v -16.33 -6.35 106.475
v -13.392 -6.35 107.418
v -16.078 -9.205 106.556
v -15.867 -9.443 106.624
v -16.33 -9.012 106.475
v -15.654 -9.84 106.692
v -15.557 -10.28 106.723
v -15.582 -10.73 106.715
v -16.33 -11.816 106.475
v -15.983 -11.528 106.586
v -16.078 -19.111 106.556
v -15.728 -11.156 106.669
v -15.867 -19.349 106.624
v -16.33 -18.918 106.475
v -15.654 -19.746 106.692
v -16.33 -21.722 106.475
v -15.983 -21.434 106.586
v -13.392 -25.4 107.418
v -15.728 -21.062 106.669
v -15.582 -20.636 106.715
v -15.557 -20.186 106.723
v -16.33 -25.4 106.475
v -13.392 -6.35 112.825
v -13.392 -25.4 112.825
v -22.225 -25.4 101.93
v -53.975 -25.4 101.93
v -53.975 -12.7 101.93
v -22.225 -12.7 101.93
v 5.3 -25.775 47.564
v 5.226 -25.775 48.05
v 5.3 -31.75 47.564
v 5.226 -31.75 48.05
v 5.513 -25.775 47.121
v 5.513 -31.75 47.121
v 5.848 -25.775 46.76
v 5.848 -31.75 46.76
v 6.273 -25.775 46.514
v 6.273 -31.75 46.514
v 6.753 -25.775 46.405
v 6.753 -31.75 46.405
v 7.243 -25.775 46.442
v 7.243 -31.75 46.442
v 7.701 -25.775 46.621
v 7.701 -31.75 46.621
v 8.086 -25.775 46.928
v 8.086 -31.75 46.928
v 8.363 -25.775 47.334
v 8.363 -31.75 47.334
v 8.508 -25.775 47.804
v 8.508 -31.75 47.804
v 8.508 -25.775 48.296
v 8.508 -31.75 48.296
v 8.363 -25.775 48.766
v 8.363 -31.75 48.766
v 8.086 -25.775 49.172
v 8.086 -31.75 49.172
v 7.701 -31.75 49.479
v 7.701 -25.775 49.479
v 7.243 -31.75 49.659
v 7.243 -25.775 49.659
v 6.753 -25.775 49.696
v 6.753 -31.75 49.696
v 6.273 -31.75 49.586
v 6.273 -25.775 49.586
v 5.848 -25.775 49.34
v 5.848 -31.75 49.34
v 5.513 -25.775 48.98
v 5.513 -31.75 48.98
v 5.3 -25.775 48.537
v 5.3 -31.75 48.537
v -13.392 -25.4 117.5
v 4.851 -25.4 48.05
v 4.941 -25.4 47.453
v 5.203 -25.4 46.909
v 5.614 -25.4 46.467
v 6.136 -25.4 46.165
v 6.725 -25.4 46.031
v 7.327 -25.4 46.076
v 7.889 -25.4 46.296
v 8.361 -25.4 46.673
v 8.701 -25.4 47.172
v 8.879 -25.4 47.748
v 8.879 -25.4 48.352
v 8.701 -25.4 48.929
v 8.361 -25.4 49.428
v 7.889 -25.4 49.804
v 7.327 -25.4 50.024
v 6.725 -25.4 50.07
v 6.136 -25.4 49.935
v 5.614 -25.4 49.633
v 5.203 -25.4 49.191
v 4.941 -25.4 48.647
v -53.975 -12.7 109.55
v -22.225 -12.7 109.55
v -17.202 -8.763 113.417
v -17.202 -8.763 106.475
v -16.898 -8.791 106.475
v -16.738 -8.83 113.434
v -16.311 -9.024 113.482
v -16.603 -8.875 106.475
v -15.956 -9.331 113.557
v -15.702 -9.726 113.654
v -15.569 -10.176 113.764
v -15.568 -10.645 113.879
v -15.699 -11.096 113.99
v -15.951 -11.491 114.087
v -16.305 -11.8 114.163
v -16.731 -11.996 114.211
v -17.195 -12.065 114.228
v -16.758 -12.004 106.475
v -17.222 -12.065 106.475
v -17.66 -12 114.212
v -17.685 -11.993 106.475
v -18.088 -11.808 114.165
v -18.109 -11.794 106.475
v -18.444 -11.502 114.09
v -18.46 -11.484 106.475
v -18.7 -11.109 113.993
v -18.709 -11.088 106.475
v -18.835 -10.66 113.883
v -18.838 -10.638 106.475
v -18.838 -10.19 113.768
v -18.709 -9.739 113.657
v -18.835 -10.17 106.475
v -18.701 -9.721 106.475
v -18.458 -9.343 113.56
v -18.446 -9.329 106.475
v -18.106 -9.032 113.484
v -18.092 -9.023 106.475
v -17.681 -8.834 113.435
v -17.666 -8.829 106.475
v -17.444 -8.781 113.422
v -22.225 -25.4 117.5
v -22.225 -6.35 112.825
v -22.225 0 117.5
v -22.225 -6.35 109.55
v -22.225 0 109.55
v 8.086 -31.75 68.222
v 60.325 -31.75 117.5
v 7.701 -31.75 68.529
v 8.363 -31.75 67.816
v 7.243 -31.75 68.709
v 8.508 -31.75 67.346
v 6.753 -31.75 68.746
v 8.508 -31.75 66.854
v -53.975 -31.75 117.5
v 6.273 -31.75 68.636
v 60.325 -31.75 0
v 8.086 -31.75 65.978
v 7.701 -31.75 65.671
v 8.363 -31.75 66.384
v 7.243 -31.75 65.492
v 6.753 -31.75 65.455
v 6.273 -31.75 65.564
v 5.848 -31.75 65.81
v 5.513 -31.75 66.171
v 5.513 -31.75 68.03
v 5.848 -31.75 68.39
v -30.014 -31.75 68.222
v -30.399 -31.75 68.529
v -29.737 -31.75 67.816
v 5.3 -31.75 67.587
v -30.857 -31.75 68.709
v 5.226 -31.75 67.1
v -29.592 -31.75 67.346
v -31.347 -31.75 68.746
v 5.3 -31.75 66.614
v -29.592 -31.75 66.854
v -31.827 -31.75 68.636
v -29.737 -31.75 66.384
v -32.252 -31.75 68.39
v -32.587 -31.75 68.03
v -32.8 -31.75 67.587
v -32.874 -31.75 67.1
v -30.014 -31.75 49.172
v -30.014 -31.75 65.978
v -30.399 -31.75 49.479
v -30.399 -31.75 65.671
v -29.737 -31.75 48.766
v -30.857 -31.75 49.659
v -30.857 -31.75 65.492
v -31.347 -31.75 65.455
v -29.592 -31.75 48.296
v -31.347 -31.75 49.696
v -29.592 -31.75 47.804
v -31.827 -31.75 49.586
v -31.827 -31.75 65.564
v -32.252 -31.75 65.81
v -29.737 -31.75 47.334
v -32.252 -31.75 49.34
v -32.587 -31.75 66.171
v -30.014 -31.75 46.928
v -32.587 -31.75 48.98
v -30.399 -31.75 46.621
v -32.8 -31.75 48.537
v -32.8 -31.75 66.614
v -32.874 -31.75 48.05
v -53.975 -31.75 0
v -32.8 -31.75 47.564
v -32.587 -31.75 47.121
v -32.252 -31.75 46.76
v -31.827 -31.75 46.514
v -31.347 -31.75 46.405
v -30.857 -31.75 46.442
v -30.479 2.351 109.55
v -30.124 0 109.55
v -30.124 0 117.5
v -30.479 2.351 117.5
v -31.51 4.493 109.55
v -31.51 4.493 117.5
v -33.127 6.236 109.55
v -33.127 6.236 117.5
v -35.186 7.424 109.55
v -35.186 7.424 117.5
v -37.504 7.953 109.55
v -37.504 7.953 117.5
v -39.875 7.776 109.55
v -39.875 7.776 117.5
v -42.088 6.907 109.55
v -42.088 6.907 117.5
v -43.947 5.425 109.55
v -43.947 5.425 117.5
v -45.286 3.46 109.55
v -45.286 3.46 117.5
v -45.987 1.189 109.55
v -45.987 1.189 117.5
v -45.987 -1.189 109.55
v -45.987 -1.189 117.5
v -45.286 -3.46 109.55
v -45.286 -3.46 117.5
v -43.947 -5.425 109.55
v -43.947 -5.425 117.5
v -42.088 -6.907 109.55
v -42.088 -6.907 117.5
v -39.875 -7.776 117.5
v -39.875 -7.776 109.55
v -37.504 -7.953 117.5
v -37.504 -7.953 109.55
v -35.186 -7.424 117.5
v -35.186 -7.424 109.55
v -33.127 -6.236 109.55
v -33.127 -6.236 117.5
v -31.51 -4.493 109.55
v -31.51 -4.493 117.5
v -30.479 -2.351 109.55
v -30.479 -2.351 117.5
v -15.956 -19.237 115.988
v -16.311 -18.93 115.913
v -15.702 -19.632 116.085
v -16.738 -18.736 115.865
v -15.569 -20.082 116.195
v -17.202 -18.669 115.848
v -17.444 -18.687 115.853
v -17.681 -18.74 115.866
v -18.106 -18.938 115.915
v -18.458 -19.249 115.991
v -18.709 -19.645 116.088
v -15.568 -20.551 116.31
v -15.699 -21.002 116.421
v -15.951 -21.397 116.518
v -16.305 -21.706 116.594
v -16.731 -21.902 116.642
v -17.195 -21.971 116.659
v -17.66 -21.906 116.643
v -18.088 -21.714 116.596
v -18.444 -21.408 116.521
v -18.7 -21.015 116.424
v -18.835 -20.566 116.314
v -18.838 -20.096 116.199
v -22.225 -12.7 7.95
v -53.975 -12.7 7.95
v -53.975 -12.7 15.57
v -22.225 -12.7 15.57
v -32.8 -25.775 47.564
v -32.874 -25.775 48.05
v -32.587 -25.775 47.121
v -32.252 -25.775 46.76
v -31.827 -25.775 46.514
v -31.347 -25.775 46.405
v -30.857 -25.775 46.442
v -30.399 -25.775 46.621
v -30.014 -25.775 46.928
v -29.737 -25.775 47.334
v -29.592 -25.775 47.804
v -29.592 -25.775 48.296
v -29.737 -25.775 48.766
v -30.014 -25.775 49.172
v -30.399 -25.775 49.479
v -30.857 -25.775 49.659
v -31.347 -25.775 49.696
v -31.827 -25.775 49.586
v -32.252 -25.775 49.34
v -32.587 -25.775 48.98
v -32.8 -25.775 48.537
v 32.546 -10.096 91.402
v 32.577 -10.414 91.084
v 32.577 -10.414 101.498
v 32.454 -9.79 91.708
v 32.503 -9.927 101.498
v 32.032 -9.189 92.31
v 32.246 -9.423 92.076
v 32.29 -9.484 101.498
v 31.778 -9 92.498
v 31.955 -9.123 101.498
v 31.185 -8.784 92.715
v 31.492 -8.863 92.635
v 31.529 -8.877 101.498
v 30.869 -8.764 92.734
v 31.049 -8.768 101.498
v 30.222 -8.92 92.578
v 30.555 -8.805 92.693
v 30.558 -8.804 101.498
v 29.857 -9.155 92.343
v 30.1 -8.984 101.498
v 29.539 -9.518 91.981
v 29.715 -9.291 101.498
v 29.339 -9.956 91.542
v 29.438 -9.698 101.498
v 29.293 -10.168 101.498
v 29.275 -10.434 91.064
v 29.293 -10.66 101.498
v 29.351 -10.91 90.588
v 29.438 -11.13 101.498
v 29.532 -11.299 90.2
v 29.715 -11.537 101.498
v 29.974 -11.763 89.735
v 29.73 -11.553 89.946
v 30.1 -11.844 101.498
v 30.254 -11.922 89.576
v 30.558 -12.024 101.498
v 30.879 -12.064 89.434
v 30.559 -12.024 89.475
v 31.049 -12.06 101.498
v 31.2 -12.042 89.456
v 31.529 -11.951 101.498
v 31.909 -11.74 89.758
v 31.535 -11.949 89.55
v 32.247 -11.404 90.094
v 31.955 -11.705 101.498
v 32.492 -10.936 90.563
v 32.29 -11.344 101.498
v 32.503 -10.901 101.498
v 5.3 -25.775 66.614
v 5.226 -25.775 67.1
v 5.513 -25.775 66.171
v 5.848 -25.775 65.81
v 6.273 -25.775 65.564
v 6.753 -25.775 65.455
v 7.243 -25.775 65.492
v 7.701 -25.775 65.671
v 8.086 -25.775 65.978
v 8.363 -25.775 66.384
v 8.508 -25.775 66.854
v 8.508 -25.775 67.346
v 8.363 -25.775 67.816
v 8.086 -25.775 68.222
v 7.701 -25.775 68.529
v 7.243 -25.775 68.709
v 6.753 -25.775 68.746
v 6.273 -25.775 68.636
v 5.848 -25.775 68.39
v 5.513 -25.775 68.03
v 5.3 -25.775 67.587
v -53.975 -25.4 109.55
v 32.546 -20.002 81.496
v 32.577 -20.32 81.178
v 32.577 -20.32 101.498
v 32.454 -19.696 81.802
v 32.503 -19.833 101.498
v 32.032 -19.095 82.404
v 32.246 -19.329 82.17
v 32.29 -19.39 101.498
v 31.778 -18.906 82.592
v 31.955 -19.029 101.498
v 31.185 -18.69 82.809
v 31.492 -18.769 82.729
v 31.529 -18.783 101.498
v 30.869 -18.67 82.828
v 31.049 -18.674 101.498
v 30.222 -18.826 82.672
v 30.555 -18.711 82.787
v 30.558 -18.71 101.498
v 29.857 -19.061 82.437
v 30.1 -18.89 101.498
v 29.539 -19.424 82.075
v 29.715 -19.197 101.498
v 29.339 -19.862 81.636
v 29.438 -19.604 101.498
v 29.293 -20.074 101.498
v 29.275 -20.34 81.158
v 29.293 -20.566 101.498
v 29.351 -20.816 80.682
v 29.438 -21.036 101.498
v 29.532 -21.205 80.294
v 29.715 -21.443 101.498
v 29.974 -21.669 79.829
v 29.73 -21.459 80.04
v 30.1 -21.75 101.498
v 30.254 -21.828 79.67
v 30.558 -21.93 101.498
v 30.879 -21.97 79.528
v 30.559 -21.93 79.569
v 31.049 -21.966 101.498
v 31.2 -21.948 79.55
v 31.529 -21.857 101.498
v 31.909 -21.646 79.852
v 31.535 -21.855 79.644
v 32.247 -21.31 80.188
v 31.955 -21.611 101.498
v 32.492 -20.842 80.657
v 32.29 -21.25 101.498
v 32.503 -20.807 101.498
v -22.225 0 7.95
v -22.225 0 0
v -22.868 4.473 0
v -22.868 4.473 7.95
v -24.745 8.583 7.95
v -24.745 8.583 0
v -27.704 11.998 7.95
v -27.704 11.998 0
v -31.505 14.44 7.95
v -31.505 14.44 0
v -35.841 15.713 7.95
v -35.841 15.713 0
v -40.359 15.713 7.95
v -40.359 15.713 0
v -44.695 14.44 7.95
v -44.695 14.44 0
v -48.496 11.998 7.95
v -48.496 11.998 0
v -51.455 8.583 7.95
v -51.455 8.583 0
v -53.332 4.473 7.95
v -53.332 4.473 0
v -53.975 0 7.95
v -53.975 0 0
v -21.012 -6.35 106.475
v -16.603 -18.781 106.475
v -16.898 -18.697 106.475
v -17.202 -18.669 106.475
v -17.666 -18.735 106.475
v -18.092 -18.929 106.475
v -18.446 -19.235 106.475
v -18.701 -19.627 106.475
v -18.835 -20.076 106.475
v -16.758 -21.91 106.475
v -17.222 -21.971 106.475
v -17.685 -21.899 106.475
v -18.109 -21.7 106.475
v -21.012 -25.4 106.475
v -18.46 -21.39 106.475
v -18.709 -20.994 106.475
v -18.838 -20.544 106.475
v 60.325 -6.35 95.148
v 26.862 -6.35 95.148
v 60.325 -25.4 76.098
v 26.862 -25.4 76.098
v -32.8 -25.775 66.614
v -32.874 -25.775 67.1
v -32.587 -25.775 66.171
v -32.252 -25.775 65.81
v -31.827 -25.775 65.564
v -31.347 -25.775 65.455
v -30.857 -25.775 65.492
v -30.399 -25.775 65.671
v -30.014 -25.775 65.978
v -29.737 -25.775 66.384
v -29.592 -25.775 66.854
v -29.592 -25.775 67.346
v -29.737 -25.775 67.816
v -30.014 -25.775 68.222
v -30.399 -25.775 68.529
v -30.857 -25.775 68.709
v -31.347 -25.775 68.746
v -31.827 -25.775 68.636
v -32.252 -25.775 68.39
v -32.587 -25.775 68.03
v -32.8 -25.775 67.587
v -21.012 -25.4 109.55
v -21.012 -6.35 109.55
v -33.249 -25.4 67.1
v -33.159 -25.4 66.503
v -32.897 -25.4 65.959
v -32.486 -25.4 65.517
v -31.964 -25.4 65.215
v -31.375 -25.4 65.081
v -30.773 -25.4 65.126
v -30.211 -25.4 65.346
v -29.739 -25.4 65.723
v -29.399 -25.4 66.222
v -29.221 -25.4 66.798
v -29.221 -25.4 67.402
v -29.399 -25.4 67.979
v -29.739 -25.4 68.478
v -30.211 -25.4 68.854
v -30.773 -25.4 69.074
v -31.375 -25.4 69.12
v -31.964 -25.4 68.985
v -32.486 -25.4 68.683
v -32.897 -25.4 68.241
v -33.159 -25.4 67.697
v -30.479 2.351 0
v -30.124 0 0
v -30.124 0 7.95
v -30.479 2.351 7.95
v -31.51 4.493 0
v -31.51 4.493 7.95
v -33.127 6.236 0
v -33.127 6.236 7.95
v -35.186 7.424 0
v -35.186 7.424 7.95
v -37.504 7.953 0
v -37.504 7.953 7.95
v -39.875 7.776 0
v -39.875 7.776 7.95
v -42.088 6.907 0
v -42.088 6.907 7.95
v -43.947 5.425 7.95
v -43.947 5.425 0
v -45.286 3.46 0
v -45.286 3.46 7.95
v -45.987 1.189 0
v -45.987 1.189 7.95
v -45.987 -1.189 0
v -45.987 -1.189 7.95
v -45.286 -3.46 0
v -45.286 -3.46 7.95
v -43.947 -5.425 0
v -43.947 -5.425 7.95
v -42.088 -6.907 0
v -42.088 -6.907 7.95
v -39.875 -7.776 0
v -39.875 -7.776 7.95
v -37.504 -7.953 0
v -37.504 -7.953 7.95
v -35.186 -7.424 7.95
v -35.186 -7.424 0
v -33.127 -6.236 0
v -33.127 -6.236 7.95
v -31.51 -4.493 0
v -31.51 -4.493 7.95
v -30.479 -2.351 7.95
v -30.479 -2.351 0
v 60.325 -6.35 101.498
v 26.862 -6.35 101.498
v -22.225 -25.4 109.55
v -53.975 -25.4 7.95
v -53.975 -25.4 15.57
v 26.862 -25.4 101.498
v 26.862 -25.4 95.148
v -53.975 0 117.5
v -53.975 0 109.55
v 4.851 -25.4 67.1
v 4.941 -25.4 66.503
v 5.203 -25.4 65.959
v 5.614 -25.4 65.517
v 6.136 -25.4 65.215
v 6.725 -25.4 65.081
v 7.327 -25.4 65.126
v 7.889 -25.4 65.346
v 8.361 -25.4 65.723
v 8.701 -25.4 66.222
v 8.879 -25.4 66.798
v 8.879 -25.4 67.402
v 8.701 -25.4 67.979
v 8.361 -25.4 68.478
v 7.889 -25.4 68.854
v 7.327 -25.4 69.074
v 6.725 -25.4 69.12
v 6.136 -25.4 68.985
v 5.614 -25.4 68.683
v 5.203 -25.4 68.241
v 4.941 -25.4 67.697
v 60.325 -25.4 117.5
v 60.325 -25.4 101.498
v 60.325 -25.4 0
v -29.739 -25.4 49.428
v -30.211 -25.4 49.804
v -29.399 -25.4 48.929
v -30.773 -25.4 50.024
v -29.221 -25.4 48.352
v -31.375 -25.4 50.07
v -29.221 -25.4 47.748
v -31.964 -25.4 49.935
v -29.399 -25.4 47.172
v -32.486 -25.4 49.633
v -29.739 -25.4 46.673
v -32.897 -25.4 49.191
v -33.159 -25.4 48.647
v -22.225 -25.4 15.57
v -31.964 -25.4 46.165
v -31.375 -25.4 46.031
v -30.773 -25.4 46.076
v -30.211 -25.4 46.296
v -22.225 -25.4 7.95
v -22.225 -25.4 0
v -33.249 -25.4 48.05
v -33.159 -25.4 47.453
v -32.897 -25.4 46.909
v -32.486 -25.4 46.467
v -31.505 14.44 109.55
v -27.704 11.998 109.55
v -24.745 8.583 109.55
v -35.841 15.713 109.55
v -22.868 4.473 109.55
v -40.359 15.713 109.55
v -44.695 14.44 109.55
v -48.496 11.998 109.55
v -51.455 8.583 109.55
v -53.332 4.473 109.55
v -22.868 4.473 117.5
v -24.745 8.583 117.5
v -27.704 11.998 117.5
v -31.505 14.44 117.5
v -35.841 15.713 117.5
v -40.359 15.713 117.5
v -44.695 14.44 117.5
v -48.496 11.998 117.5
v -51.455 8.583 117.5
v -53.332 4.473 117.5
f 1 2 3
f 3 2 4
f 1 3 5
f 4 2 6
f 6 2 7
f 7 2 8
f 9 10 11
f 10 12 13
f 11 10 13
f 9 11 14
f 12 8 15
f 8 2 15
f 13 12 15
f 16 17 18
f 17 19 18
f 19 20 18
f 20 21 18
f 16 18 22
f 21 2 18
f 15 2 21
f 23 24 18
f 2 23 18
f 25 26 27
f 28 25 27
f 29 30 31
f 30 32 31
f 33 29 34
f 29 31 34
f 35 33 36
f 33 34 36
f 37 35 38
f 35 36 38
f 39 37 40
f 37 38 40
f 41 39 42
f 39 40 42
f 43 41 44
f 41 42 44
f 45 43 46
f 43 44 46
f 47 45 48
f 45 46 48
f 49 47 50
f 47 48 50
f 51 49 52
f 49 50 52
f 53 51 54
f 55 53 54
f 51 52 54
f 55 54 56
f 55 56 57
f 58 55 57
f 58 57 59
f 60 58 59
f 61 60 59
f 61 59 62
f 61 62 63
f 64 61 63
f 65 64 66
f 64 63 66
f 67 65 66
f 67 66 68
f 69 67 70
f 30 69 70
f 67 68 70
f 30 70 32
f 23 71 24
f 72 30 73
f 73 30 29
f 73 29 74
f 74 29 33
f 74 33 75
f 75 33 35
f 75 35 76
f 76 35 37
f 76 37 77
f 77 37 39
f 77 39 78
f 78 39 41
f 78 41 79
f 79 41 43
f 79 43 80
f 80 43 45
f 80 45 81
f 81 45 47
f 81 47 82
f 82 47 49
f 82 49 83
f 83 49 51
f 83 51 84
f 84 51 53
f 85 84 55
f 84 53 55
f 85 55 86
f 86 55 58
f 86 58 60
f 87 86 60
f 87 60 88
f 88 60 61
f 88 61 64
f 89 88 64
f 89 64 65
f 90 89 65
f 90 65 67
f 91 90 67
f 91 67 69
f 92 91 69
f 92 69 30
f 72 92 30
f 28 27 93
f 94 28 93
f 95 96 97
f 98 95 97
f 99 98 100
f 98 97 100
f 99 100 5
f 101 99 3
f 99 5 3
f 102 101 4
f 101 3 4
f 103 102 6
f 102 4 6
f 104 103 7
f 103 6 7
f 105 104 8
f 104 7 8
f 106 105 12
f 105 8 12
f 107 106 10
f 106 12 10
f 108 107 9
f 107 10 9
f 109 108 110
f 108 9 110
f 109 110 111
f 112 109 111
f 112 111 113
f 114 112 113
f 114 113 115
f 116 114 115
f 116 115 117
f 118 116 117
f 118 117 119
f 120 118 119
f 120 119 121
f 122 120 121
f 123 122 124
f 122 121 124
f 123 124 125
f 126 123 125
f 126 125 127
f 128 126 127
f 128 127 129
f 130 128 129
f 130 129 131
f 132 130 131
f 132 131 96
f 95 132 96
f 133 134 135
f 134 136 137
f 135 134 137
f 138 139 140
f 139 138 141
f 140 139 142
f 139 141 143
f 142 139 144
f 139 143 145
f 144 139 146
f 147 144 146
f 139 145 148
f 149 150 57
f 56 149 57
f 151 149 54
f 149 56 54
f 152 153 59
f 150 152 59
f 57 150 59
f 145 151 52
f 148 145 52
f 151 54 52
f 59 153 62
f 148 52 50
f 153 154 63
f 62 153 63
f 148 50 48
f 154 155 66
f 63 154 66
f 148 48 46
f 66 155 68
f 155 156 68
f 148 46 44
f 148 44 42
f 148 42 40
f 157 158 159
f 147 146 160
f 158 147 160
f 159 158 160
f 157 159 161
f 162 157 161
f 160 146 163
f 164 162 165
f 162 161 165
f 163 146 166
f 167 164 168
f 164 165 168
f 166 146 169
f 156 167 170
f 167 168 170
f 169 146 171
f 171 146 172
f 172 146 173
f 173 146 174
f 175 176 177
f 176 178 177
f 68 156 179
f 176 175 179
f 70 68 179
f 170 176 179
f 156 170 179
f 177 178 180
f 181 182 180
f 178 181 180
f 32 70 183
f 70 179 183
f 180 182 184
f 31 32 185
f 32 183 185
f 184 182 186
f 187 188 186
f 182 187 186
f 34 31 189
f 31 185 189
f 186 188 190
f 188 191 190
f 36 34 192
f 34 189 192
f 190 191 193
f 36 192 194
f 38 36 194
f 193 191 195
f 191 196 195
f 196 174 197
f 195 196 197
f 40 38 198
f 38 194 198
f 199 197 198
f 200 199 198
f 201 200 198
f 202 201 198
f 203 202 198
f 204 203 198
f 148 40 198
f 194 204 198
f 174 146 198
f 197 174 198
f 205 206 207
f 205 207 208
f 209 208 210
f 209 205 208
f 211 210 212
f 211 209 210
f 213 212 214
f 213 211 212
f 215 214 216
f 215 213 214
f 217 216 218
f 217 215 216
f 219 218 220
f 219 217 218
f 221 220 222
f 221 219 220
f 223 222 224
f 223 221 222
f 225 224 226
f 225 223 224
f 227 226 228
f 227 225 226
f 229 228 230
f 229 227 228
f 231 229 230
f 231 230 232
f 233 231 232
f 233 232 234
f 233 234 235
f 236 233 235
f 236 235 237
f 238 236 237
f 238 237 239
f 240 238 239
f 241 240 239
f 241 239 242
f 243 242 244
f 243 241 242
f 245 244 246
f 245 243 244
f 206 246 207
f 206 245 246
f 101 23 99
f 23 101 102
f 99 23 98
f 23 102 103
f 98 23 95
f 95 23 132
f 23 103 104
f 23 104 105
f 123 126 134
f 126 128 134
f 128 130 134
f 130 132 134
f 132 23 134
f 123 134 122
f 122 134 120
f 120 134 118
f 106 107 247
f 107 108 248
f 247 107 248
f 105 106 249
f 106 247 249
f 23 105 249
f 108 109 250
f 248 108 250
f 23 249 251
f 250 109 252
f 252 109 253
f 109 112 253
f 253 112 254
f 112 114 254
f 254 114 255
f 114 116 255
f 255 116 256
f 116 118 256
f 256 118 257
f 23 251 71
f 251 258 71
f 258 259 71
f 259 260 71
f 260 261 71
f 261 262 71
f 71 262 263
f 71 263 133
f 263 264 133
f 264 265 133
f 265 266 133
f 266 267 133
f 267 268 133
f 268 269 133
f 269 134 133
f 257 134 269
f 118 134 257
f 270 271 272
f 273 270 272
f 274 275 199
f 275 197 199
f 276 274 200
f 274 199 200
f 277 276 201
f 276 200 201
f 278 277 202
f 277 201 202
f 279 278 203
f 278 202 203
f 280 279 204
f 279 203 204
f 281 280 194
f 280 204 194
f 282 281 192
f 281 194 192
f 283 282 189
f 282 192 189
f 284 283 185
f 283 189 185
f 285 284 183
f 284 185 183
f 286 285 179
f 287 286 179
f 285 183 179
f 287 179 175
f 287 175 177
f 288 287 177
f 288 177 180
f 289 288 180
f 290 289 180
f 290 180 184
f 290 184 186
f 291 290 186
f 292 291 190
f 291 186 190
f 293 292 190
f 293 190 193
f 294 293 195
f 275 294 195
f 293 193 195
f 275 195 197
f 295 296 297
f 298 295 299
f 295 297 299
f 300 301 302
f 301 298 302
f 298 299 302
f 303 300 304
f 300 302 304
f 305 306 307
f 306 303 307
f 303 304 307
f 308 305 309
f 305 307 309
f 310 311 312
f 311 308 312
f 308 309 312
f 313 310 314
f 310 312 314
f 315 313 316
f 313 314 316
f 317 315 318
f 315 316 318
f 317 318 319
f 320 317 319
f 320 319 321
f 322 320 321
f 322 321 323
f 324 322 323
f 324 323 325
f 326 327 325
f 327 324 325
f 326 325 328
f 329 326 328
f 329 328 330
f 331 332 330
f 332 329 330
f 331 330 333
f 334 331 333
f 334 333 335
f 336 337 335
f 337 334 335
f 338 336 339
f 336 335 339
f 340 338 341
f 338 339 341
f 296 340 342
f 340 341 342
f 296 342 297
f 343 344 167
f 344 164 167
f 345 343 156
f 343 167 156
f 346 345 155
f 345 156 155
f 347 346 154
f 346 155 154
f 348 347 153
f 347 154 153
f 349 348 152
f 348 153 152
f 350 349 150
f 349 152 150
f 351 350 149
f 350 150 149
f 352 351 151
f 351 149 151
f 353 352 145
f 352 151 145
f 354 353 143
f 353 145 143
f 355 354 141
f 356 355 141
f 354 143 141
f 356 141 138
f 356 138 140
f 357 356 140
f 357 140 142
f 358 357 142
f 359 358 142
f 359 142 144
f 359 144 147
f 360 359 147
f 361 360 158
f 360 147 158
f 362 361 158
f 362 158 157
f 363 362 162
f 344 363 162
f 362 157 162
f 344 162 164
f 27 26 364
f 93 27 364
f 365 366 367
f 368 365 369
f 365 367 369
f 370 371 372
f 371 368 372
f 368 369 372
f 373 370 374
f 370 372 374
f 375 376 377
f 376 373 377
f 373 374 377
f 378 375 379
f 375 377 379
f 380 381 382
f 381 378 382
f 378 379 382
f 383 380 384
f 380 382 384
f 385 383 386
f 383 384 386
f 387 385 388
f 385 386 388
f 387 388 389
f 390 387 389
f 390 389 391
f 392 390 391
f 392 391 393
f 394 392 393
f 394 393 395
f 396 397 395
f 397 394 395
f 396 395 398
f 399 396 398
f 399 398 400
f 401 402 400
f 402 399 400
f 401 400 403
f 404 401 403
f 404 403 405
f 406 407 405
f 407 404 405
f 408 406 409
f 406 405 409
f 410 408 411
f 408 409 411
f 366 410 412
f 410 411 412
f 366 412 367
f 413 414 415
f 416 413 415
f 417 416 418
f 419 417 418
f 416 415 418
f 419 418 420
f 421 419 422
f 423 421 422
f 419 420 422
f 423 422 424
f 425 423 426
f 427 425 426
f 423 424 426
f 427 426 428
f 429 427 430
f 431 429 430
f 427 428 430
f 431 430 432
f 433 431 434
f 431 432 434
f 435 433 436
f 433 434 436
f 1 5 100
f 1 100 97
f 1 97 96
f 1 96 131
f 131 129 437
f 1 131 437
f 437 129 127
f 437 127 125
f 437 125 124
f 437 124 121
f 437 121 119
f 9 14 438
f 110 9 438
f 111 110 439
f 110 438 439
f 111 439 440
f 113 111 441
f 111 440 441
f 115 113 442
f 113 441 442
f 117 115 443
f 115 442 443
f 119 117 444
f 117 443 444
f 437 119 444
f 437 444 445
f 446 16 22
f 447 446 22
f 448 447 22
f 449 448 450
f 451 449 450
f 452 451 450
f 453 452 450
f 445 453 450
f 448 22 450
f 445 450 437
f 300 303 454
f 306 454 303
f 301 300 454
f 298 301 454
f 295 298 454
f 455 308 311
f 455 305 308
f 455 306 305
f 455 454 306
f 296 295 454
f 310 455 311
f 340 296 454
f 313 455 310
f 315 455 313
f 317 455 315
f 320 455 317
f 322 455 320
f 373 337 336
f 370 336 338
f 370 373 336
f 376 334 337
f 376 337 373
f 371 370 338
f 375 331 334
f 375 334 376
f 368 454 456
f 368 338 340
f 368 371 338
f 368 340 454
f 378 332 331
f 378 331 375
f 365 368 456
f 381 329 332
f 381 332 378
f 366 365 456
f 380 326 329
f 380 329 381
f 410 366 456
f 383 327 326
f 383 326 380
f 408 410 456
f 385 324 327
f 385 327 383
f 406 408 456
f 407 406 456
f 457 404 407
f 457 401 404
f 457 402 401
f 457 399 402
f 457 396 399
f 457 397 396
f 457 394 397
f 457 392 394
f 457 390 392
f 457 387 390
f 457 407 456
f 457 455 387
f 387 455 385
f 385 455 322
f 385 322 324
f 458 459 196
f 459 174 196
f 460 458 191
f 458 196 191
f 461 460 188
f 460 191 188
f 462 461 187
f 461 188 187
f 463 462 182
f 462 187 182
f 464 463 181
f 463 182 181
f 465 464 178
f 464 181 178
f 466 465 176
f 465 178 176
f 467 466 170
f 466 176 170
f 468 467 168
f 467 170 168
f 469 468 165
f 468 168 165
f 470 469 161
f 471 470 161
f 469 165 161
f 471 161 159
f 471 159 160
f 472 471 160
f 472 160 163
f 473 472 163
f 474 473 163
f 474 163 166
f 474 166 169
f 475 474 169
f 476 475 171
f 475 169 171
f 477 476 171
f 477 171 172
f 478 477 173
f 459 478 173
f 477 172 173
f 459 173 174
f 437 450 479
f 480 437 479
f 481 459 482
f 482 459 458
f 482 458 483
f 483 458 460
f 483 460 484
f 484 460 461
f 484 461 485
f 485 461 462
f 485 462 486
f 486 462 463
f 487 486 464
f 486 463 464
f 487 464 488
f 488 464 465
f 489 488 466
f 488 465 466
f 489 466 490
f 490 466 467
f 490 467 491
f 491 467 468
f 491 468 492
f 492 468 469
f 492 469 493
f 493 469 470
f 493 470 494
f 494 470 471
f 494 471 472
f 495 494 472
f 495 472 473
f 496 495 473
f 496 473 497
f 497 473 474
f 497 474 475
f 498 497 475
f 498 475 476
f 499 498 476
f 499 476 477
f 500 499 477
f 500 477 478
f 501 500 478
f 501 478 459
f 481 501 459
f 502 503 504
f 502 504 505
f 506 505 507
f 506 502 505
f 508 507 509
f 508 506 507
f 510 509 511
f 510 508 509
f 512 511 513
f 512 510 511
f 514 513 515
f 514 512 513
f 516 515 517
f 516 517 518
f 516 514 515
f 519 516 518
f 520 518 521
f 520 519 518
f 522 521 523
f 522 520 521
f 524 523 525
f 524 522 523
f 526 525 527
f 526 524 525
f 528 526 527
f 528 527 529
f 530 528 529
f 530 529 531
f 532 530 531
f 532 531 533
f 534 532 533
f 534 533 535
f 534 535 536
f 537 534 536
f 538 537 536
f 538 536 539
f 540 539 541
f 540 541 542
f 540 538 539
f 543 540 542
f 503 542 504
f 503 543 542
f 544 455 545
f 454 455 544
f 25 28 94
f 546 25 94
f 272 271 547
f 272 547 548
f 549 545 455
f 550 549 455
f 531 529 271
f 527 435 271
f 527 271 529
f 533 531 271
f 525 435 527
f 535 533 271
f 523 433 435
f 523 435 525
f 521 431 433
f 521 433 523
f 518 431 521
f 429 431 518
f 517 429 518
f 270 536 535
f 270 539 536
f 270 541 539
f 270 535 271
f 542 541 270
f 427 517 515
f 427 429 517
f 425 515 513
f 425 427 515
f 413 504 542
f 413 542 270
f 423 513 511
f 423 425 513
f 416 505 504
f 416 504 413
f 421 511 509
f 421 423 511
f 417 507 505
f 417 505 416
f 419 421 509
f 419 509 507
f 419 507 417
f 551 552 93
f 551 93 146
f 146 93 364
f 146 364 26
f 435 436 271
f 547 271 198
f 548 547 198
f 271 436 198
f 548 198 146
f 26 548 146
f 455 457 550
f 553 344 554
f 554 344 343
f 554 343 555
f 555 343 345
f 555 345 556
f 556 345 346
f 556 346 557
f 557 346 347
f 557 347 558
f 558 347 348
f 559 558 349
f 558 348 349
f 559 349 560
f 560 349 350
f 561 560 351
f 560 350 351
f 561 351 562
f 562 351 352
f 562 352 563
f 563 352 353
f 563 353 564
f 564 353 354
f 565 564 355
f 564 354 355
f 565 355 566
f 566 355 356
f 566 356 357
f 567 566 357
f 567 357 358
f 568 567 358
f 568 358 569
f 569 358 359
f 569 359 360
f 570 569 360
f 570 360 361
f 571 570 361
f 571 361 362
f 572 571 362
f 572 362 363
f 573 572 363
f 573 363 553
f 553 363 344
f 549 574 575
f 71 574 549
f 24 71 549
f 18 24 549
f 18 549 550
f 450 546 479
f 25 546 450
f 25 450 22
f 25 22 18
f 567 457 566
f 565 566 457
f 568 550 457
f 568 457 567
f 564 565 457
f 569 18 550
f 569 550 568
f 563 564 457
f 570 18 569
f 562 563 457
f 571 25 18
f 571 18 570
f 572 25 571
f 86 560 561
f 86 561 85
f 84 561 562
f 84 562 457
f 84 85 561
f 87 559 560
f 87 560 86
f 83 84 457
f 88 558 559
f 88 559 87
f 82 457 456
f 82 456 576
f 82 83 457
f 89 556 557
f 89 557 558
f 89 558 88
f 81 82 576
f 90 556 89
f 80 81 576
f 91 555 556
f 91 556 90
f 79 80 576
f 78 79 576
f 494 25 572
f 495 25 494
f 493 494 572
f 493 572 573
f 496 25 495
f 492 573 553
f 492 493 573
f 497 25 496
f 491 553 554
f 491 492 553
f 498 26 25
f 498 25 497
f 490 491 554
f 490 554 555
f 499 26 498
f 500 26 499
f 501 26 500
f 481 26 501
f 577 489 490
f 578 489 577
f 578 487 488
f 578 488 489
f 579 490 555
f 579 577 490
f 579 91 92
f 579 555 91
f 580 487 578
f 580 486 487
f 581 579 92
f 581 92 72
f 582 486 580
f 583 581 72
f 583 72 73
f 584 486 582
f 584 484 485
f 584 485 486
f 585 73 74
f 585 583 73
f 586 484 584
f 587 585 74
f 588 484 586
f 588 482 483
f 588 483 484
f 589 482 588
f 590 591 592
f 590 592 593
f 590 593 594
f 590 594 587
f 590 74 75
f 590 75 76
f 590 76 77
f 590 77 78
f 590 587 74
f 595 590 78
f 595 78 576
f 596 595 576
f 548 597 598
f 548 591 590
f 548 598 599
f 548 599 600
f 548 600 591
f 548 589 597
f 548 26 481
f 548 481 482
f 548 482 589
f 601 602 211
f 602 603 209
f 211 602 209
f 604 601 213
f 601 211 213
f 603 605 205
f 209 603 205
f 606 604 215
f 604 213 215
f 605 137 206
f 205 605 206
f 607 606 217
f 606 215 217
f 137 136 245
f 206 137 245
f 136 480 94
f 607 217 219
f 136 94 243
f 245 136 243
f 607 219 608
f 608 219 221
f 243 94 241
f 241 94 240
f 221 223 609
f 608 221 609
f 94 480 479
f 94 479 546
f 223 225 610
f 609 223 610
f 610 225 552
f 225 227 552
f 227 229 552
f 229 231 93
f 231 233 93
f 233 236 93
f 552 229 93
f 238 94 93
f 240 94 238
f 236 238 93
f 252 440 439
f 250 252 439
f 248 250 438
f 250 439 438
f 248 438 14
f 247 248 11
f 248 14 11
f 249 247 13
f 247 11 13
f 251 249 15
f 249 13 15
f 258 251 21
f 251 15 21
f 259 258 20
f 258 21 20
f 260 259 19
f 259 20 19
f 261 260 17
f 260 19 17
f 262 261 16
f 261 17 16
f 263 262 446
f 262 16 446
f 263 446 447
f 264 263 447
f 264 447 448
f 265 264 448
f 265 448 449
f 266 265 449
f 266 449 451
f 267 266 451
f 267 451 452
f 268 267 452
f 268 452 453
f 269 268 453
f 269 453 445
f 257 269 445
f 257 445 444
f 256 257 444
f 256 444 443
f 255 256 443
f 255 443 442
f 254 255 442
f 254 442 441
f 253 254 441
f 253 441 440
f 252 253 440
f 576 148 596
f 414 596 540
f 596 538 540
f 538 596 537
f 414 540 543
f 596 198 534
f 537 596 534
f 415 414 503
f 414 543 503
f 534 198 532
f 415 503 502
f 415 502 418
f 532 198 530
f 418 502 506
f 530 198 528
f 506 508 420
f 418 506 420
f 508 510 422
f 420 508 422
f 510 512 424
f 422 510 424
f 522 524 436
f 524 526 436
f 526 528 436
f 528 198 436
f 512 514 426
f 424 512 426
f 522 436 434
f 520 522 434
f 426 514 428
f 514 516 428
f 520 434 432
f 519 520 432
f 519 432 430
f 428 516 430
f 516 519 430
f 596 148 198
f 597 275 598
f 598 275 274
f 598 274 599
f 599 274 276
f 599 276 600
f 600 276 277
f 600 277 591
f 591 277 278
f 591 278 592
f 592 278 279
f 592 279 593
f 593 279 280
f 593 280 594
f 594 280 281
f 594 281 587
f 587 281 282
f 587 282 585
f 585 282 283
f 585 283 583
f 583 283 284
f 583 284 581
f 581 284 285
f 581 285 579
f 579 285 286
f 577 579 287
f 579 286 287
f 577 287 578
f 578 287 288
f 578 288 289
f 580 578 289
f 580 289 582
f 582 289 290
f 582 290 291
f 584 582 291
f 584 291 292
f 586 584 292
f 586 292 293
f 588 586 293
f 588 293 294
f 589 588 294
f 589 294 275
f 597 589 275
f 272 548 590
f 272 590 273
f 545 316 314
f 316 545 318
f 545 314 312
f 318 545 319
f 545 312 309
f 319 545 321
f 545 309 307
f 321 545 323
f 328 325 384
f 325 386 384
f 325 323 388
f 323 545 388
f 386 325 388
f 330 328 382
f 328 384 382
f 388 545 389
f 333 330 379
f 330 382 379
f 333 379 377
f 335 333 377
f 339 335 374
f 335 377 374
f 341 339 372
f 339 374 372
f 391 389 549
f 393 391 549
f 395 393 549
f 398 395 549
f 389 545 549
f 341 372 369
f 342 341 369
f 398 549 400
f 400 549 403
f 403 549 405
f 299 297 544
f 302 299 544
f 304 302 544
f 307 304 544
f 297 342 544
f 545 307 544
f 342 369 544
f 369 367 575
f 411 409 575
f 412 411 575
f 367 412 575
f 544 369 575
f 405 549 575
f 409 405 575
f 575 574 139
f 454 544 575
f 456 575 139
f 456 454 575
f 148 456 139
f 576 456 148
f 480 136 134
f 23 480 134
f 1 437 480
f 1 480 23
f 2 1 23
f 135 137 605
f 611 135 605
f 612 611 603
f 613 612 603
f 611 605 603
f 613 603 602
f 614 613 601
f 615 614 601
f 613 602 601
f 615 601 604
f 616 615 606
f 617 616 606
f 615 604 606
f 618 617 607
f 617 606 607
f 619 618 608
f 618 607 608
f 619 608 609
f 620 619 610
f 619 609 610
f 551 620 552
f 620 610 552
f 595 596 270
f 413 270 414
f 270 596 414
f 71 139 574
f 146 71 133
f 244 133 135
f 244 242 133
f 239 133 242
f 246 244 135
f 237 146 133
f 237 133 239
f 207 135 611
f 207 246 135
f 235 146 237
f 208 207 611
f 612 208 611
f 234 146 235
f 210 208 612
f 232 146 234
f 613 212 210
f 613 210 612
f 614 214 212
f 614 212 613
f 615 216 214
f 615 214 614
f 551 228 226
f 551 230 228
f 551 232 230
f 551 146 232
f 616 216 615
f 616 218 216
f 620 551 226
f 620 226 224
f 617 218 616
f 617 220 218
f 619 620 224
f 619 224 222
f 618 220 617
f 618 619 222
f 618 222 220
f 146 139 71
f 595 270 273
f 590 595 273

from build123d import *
from build123d.topology import SkipClean

# Parameters (mm, degrees)
SKETCH2_R                       = 7.9756
BOSS_EXTRUDE1_DEPTH             = 7.9502
SKETCH3_W                       = 107.95
SKETCH3_H                       = 6.35
BOSS_EXTRUDE2_DEPTH             = 101.6
SKETCH4_R                       = 7.9756
BOSS_EXTRUDE3_DEPTH             = 7.9502
SKETCH5_W                       = 117.5004
SKETCH5_H                       = 6.35
BOSS_EXTRUDE4_DEPTH             = 6.35
SKETCH6_W                       = 33.463288309
SKETCH6_H                       = 6.35
BOSS_EXTRUDE5_DEPTH             = 19.05
BOSS_EXTRUDE6_START             = -33.463288
BOSS_EXTRUDE6_DEPTH             = 33.463288
BOSS_EXTRUDE8_DEPTH             = 8.83271
M4X0_7_TAPPED_HOLE1_D           = 3.3
M4X0_7_TAPPED_HOLE1_CSINK_D     = 4.05
M4X0_7_TAPPED_HOLE1_CSINK_ANGLE = 90
CUT_EXTRUDE1_REACH              = 124.266
SKETCH15_R                      = 1.651
CUT_EXTRUDE2_REACH              = 128.428
SKETCH18_R                      = 1.651
SKETCH19_W                      = 7.62
SKETCH19_H                      = 12.7
BOSS_EXTRUDE9_DEPTH             = 31.75


with BuildPart() as part:
    # Sketch2 → Boss-Extrude1 (new body)
    with BuildSketch(Plane.XY):
        with BuildLine():
            Line((-22.225, -25.4), (-22.225, 0))
            ThreePointArc((-22.225, 0), (-38.1, 15.875), (-53.975, 0))
            Line((-53.975, 0), (-53.975, -31.75))
            Line((-53.975, -31.75), (53.975, -31.75))
            Line((53.975, -31.75), (53.975, -25.4))
            Line((53.975, -25.4), (22.225, -25.4))
            Line((22.225, -25.4), (-22.225, -25.4))
        make_face()
        with Locations((-38.1, 0)):
            Circle(SKETCH2_R, mode=Mode.SUBTRACT)
    extrude(amount=BOSS_EXTRUDE1_DEPTH)

    # Sketch3 → Boss-Extrude2 (add)
    with BuildSketch(Plane.XY.offset(7.9502)):
        with Locations((0, -28.575)):
            Rectangle(SKETCH3_W, SKETCH3_H)
    extrude(amount=BOSS_EXTRUDE2_DEPTH)

    # Sketch4 → Boss-Extrude3 (add)
    with BuildSketch(Plane.XY.offset(109.5502)):
        with BuildLine():
            Line((-53.975, 0), (-53.975, -31.75))
            Line((-53.975, -31.75), (53.975, -31.75))
            Line((53.975, -31.75), (53.975, -25.4))
            Line((53.975, -25.4), (-22.225, -25.4))
            Line((-22.225, -25.4), (-22.225, 0))
            ThreePointArc((-22.225, 0), (-38.1, 15.875), (-53.975, 0))
        make_face()
        with Locations((-38.1, 0)):
            Circle(SKETCH4_R, mode=Mode.SUBTRACT)
    extrude(amount=BOSS_EXTRUDE3_DEPTH)

    # Sketch5 → Boss-Extrude4 (add)
    with BuildSketch(Plane(origin=(53.975, 0, 0), x_dir=(0, 0, -1), z_dir=(1, 0, 0))):
        with Locations((-58.7502, -28.575)):
            Rectangle(SKETCH5_W, SKETCH5_H)
    extrude(amount=BOSS_EXTRUDE4_DEPTH)

    # Sketch6 → Boss-Extrude5 (add)
    with BuildSketch(Plane(origin=(0, -25.4, 0), x_dir=(1, 0, 0), z_dir=(0, 1, 0))):
        with Locations((43.593355845, -98.3234)):
            Rectangle(SKETCH6_W, SKETCH6_H)
        Polygon((-13.392288309, -112.8252), (-13.392288309, -107.418332231), (-16.329801264, -106.4752), (-21.012288309, -106.4752), (-21.012288309, -109.5502), (-22.225, -109.5502), (-22.225, -112.8252), align=None)
    extrude(amount=BOSS_EXTRUDE5_DEPTH)

    # Sketch8 → Boss-Extrude6 (add)
    with SkipClean():  # the faces are left unmerged after this step: merging them gives an invalid solid
        with BuildSketch(Plane(origin=(60.325, 0, 0), x_dir=(0, 0, -1), z_dir=(1, 0, 0)).offset(BOSS_EXTRUDE6_START)):
            Polygon((-95.1484, -6.35), (-76.0984, -25.4), (-95.1484, -25.4), align=None)
        extrude(amount=BOSS_EXTRUDE6_DEPTH)

    # Sketch10 → Boss-Extrude8 (add)
    with SkipClean():  # the faces are left unmerged after this step: merging them gives an invalid solid
        with BuildSketch(Plane(origin=(-22.225, 0, 0), x_dir=(0, 0, -1), z_dir=(1, 0, 0))):
            Polygon((-112.8252, -6.35), (-117.5004, -25.4), (-112.8252, -25.4), align=None)
        extrude(amount=BOSS_EXTRUDE8_DEPTH)

    # M4x0.7 Tapped Hole1 (through all)
    with Locations(Plane(origin=(0, -25.4, 0), x_dir=(1, 0, 0), z_dir=(0, 1, 0))):
        with Locations((6.876306211, -48.0502), (6.876306211, -67.1002), (-31.223693789, -67.1002), (-31.223693789, -48.0502)):
            CounterSinkHole(M4X0_7_TAPPED_HOLE1_D / 2, M4X0_7_TAPPED_HOLE1_CSINK_D / 2, counter_sink_angle=M4X0_7_TAPPED_HOLE1_CSINK_ANGLE)

    # Cut-Extrude1: up to this plane
    with SkipClean():  # the faces are left unmerged after this step: merging them gives an invalid solid
        cut_extrude1_end = Plane(origin=(26.861711691, -6.35, 95.1484), z_dir=(0, 0.7071067811865517, -0.7071067811865435))
        # Sketch15 → Cut-Extrude1 (cut, up to the surface)
        with BuildSketch(Plane.XY.offset(101.4984), mode=Mode.PRIVATE) as cut_extrude1_sk1:
            with Locations((30.925711691, -10.414)):
                Circle(SKETCH15_R)
        cut_extrude1_tool1 = split(extrude(cut_extrude1_sk1.sketch, amount=-CUT_EXTRUDE1_REACH, mode=Mode.PRIVATE), bisect_by=cut_extrude1_end, keep=Keep.BOTH, mode=Mode.PRIVATE)
        add(cut_extrude1_tool1.solids().sort_by_distance((30.925712, -10.414, 101.4984))[0], mode=Mode.SUBTRACT)
        # Sketch15 → Cut-Extrude1 (cut, up to the surface)
        with BuildSketch(Plane.XY.offset(101.4984), mode=Mode.PRIVATE) as cut_extrude1_sk2:
            with Locations((30.925711691, -20.32)):
                Circle(SKETCH15_R)
        cut_extrude1_tool2 = split(extrude(cut_extrude1_sk2.sketch, amount=-CUT_EXTRUDE1_REACH, mode=Mode.PRIVATE), bisect_by=cut_extrude1_end, keep=Keep.BOTH, mode=Mode.PRIVATE)
        add(cut_extrude1_tool2.solids().sort_by_distance((30.925712, -20.32, 101.4984))[0], mode=Mode.SUBTRACT)

    # Cut-Extrude2: up to this plane
    with SkipClean():  # the faces are left unmerged after this step: merging them gives an invalid solid
        cut_extrude2_end = Plane(origin=(-13.392288309, -6.35, 112.8252), z_dir=(0, -0.23834455727061551, -0.9711806587960216))
        # Sketch18 → Cut-Extrude2 (cut, up to the surface)
        with BuildSketch(Plane(origin=(0, 0, 106.4752), x_dir=(-1, 0, 0), z_dir=(0, 0, -1)), mode=Mode.PRIVATE) as cut_extrude2_sk1:
            with Locations(Location((17.202288309, -10.414, 0), (0, 0, 90))):
                Circle(SKETCH18_R)
        cut_extrude2_tool1 = split(extrude(cut_extrude2_sk1.sketch, amount=-CUT_EXTRUDE2_REACH, mode=Mode.PRIVATE), bisect_by=cut_extrude2_end, keep=Keep.BOTH, mode=Mode.PRIVATE)
        add(cut_extrude2_tool1.solids().sort_by_distance((-17.202288, -10.414, 106.4752))[0], mode=Mode.SUBTRACT)
        # Sketch18 → Cut-Extrude2 (cut, up to the surface)
        with BuildSketch(Plane(origin=(0, 0, 106.4752), x_dir=(-1, 0, 0), z_dir=(0, 0, -1)), mode=Mode.PRIVATE) as cut_extrude2_sk2:
            with Locations(Location((17.202288309, -20.32, 0), (0, 0, 90))):
                Circle(SKETCH18_R)
        cut_extrude2_tool2 = split(extrude(cut_extrude2_sk2.sketch, amount=-CUT_EXTRUDE2_REACH, mode=Mode.PRIVATE), bisect_by=cut_extrude2_end, keep=Keep.BOTH, mode=Mode.PRIVATE)
        add(cut_extrude2_tool2.solids().sort_by_distance((-17.202288, -20.32, 106.4752))[0], mode=Mode.SUBTRACT)

    # Sketch19 → Boss-Extrude9 (add)
    with SkipClean():  # the faces are left unmerged after this step: merging them gives an invalid solid
        with BuildSketch(Plane.ZY.offset(53.975)):
            with Locations((11.7602, -19.05)):
                Rectangle(SKETCH19_W, SKETCH19_H)
            with Locations((105.7402, -19.05)):
                Rectangle(SKETCH19_W, SKETCH19_H)
        extrude(amount=-BOSS_EXTRUDE9_DEPTH)


solid = part.part
